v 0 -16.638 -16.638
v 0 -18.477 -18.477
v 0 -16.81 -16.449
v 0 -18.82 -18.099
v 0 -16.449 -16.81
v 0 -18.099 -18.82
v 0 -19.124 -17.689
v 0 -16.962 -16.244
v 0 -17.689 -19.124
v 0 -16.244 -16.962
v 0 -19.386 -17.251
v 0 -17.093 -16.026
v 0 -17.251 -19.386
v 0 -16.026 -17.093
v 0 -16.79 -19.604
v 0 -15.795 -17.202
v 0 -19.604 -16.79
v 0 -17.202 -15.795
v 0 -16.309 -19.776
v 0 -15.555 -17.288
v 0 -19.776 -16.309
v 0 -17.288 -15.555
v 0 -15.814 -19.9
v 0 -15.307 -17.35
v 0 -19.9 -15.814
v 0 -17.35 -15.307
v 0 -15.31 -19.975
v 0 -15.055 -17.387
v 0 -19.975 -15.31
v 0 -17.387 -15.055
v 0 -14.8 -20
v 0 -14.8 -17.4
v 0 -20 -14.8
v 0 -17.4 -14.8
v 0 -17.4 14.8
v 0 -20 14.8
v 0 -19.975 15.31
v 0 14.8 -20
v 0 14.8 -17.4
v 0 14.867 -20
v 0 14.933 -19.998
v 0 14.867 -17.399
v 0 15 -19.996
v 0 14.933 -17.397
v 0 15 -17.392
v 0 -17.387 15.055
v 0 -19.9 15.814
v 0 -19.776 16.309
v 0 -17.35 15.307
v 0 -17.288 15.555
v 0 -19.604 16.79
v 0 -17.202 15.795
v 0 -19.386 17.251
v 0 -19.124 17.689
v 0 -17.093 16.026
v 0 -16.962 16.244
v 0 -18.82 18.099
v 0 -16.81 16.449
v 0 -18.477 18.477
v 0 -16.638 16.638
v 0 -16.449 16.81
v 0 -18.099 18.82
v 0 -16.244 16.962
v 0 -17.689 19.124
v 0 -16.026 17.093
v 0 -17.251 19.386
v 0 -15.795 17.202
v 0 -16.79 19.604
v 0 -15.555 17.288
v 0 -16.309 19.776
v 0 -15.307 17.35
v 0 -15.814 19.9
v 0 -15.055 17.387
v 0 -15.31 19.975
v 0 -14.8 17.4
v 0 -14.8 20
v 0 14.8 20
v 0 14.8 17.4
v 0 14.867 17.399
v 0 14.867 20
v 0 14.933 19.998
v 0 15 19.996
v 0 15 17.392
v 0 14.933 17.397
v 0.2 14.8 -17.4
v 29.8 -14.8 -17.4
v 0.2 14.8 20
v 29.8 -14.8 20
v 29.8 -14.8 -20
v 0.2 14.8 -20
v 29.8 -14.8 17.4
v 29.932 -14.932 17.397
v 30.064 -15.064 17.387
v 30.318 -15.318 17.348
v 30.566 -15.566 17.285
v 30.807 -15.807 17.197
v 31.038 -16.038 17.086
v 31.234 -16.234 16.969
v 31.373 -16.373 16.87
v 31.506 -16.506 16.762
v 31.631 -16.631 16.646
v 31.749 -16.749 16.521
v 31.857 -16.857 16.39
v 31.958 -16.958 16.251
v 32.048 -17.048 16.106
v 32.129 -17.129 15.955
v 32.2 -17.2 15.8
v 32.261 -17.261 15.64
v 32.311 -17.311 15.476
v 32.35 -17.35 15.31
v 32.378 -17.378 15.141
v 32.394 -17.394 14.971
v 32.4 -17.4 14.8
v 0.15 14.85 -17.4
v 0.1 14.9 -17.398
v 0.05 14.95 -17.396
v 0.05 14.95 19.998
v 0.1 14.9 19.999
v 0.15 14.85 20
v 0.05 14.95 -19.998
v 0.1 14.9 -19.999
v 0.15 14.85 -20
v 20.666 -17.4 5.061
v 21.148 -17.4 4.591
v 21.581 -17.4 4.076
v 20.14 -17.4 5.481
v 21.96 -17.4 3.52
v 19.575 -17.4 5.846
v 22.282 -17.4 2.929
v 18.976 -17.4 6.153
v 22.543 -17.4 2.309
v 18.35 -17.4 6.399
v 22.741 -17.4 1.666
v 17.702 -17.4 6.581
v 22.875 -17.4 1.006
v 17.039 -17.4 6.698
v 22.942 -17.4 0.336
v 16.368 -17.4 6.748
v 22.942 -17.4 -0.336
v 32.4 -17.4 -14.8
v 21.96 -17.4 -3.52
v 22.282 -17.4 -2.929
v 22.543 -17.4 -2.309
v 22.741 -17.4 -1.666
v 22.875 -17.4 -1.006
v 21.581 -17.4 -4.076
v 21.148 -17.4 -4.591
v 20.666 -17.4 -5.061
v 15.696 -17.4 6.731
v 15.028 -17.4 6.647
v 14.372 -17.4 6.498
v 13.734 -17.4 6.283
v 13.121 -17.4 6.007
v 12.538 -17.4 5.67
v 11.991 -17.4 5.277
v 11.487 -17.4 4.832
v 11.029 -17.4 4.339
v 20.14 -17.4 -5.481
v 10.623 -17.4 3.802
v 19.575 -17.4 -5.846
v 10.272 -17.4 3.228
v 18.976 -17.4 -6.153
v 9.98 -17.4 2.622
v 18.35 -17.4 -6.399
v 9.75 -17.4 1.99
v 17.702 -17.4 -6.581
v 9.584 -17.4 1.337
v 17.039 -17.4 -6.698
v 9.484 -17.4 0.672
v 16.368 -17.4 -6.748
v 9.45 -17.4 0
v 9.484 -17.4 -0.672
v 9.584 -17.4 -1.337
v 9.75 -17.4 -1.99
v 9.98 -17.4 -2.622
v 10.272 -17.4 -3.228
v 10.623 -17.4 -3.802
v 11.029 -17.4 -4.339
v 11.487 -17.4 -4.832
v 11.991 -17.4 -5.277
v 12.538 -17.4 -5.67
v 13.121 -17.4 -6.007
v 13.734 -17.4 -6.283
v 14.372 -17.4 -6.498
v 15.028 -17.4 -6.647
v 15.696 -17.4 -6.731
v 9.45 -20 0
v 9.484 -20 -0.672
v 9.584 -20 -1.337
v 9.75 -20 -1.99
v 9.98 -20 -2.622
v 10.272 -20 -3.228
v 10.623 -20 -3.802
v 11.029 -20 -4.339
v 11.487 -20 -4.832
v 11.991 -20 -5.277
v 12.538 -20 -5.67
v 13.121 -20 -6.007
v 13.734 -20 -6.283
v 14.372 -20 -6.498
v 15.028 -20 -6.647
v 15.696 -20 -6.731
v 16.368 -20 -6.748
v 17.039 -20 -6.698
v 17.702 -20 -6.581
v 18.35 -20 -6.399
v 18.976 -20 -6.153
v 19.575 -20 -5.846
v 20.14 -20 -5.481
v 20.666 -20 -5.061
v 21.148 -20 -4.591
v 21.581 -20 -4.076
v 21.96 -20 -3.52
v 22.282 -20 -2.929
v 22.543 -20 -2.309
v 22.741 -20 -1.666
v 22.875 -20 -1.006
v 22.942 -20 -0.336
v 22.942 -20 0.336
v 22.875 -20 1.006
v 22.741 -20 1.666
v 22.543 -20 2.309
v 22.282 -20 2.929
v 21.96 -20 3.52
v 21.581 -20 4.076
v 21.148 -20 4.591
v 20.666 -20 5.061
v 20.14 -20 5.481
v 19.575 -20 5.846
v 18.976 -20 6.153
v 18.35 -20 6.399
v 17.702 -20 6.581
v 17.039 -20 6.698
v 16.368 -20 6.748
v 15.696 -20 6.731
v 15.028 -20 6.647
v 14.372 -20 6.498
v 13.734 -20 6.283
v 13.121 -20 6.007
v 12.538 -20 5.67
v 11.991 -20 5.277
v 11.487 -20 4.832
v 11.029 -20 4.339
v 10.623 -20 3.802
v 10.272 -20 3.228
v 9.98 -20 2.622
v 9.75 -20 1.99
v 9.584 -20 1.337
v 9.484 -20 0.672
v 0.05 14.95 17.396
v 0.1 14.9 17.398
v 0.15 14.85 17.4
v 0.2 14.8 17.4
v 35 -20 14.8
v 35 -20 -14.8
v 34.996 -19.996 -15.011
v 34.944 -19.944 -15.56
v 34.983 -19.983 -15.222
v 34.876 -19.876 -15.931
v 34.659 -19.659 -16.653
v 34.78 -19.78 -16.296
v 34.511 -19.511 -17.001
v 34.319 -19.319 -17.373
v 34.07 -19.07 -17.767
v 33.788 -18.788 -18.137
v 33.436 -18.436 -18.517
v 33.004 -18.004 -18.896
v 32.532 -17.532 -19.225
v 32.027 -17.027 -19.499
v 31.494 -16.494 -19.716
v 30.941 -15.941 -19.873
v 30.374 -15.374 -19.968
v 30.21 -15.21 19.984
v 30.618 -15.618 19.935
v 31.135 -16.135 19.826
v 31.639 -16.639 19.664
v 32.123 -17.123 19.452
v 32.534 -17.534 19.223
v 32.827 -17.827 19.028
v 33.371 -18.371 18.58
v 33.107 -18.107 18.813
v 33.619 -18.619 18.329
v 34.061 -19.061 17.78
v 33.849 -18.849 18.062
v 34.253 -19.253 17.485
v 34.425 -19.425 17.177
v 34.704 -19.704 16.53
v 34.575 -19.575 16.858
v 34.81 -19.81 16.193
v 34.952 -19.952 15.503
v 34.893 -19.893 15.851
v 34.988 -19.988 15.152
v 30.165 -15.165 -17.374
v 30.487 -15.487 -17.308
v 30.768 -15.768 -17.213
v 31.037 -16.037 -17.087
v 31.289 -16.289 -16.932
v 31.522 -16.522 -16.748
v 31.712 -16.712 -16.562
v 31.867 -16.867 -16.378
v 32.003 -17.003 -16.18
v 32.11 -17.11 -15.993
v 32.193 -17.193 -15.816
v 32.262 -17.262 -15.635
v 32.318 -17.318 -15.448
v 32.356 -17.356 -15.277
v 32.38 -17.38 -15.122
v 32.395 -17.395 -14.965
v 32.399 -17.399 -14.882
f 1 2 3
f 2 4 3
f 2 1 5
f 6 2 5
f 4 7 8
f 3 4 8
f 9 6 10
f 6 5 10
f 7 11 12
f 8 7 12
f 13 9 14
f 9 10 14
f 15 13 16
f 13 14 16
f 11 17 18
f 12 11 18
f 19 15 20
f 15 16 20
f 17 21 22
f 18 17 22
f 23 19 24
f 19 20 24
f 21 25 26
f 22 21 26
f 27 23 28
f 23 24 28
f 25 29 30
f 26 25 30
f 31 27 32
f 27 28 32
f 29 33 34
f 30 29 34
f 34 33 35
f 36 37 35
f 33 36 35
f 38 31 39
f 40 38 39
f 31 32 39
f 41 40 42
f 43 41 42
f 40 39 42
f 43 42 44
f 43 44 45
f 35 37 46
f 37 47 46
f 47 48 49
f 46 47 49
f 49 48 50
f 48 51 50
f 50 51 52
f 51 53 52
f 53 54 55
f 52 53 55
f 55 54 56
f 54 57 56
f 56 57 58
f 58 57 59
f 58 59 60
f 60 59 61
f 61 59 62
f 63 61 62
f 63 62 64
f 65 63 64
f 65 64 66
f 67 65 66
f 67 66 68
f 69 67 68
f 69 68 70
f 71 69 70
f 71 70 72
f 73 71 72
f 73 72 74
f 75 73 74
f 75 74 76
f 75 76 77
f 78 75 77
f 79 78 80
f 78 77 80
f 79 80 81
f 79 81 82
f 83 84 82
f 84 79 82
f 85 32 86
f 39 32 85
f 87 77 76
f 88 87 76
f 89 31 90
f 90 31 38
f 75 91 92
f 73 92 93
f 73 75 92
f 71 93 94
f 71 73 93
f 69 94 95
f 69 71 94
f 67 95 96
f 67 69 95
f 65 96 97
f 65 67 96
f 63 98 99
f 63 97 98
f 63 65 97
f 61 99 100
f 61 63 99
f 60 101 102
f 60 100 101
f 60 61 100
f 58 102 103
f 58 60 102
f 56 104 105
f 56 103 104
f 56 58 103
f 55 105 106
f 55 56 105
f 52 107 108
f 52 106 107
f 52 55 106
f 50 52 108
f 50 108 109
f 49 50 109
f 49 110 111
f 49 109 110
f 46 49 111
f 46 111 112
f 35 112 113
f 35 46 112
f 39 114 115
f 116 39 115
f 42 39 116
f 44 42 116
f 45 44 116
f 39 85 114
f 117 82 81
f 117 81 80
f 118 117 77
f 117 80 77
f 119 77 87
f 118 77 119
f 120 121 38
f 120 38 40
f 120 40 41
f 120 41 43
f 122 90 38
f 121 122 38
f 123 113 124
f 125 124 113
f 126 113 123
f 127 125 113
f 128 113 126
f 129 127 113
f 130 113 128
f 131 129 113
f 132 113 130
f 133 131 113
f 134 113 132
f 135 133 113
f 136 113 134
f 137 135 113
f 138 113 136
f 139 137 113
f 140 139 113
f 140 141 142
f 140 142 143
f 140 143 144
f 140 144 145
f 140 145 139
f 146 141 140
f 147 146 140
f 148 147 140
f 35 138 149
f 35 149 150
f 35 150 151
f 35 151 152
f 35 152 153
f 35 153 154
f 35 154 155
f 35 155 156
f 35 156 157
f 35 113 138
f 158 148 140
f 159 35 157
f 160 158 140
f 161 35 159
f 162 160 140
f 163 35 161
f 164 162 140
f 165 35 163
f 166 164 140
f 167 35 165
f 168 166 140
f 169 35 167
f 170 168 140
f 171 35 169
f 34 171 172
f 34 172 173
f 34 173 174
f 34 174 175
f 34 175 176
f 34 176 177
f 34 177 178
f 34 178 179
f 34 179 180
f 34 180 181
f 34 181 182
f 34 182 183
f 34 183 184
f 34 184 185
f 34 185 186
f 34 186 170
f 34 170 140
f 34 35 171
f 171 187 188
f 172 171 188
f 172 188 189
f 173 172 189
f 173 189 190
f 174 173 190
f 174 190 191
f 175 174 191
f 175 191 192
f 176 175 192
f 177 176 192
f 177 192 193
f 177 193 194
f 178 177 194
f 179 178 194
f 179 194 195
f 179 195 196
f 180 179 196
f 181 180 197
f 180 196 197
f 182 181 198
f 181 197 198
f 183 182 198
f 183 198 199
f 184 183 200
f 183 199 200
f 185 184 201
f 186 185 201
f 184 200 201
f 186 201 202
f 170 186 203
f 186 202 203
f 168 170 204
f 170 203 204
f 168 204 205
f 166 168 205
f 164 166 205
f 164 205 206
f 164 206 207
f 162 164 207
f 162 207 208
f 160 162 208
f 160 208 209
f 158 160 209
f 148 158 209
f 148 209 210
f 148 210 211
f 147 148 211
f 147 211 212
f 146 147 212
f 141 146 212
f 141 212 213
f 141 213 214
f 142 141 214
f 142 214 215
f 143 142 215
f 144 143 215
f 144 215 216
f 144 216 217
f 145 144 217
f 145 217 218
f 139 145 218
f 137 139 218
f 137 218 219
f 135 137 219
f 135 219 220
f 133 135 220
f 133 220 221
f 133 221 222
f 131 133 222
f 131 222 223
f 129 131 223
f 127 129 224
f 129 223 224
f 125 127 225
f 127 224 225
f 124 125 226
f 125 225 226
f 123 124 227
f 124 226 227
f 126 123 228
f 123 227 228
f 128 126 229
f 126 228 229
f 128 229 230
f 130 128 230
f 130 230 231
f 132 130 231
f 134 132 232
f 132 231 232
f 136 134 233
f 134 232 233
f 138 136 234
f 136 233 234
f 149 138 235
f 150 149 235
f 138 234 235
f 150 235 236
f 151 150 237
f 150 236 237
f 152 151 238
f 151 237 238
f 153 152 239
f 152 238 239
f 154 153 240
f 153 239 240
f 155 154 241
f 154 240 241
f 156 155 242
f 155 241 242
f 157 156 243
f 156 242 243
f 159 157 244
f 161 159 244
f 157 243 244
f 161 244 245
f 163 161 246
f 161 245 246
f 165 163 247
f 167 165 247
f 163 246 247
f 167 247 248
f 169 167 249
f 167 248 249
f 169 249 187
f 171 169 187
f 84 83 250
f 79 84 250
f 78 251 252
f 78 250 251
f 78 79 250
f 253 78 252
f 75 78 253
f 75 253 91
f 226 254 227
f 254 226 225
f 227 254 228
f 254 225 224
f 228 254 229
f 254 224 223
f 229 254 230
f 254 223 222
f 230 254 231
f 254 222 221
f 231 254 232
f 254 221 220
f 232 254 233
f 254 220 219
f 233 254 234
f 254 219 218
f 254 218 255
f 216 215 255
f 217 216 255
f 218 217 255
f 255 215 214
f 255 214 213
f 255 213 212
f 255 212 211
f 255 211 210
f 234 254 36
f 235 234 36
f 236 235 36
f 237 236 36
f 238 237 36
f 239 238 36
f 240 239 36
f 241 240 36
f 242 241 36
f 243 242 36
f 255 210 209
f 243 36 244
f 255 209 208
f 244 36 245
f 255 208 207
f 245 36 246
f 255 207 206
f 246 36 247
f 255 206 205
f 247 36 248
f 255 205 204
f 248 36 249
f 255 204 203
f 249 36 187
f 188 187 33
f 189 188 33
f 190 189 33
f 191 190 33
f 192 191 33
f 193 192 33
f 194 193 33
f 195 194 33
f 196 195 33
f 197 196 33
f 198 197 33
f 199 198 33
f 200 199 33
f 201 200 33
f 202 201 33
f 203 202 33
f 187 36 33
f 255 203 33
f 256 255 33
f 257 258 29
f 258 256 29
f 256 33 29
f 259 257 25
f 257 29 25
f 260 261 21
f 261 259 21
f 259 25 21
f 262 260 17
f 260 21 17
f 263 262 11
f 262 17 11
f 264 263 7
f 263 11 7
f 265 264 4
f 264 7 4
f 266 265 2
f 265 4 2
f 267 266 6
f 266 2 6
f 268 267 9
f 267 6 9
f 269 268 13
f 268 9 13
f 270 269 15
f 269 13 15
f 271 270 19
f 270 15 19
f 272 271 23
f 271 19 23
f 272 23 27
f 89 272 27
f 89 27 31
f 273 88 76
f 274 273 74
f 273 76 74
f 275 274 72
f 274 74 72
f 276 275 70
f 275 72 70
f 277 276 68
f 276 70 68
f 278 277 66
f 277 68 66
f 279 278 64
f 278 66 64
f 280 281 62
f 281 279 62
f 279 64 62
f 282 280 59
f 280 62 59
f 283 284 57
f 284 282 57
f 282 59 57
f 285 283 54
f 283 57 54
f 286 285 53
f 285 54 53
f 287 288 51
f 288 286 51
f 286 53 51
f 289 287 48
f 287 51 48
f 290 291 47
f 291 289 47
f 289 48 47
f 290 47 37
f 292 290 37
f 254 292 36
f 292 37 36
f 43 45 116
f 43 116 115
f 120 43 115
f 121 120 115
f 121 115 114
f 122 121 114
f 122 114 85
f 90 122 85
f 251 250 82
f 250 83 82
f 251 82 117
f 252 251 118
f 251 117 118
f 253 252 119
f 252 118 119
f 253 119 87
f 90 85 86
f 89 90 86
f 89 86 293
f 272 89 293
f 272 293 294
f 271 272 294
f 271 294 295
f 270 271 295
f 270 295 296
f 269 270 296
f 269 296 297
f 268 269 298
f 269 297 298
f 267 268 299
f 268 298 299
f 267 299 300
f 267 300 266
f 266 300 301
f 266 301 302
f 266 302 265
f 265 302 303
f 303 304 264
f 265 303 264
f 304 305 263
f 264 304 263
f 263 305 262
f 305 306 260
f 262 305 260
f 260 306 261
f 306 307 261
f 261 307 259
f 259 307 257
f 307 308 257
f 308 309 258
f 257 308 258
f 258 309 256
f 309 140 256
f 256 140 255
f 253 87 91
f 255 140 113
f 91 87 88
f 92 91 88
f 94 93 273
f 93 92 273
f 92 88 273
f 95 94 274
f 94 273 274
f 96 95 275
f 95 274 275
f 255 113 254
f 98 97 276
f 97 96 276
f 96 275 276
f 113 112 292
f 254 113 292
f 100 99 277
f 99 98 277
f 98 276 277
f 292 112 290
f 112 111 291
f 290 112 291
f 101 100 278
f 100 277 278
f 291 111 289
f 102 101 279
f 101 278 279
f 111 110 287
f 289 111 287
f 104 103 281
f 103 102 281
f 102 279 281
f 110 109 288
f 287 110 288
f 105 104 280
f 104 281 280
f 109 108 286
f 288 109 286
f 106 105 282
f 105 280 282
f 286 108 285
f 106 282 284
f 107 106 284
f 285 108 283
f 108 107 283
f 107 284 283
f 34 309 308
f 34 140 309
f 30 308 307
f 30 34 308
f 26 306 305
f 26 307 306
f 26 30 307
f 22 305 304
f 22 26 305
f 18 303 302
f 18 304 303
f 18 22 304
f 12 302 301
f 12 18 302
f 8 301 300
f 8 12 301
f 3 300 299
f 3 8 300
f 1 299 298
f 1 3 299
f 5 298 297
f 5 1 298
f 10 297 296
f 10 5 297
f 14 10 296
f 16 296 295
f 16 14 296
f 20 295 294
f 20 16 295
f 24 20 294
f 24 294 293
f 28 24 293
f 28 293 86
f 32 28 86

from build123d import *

# Parameters (mm, degrees)
TUBE_SQUARE_40_X_40_X_2_6_1_DEPTH = 35
CUT_EXTRUDE1_DEPTH                = 57.789083458
M12_CLEARANCE_HOLE1_D             = 13.5
M12_CLEARANCE_HOLE1_DEPTH         = 3.15
M12_CLEARANCE_HOLE1_TIP           = 4.055809178


with BuildPart() as part:
    # Sketch11 → Tube (square) 40 X 40 X 2.6(1) (new body)
    with BuildSketch(Plane.YZ):
        with BuildLine():
            Line((-14.8, -20), (14.8, -20))
            ThreePointArc((14.8, -20), (18.476955262, -18.476955262), (20, -14.8))
            Line((20, -14.8), (20, 14.8))
            ThreePointArc((20, 14.8), (18.476955262, 18.476955262), (14.8, 20))
            Line((14.8, 20), (-14.8, 20))
            ThreePointArc((-14.8, 20), (-18.476955262, 18.476955262), (-20, 14.8))
            Line((-20, 14.8), (-20, -14.8))
            ThreePointArc((-20, -14.8), (-18.476955262, -18.476955262), (-14.8, -20))
        make_face()
        with BuildLine():
            Line((-14.8, -17.4), (14.8, -17.4))
            ThreePointArc((14.8, -17.4), (16.638477631, -16.638477631), (17.4, -14.8))
            Line((17.4, -14.8), (17.4, 14.8))
            ThreePointArc((17.4, 14.8), (16.638477631, 16.638477631), (14.8, 17.4))
            Line((14.8, 17.4), (-14.8, 17.4))
            ThreePointArc((-14.8, 17.4), (-16.638477631, 16.638477631), (-17.4, 14.8))
            Line((-17.4, 14.8), (-17.4, -14.8))
            ThreePointArc((-17.4, -14.8), (-16.638477631, -16.638477631), (-14.8, -17.4))
        make_face(mode=Mode.SUBTRACT)
    extrude(amount=TUBE_SQUARE_40_X_40_X_2_6_1_DEPTH)

    # Sketch13 → Cut-Extrude1 (cut, through all)
    with BuildSketch(Plane.XY.offset(20)):
        Polygon((-5, 20), (35, -20), (35, 20), align=None)
    extrude(amount=-CUT_EXTRUDE1_DEPTH, mode=Mode.SUBTRACT)

    # M12 Clearance Hole1
    with Locations(Plane(origin=(0, -17.4, 0), x_dir=(1, 0, 0), z_dir=(0, 1, 0))):
        with Locations((16.2, 0)):
            Hole(M12_CLEARANCE_HOLE1_D / 2, depth=M12_CLEARANCE_HOLE1_DEPTH)
            with Locations((0, 0, -(M12_CLEARANCE_HOLE1_DEPTH + M12_CLEARANCE_HOLE1_TIP / 2))):  # 118° drill point
                Cone(0, M12_CLEARANCE_HOLE1_D / 2, M12_CLEARANCE_HOLE1_TIP, mode=Mode.SUBTRACT)


solid = part.part
